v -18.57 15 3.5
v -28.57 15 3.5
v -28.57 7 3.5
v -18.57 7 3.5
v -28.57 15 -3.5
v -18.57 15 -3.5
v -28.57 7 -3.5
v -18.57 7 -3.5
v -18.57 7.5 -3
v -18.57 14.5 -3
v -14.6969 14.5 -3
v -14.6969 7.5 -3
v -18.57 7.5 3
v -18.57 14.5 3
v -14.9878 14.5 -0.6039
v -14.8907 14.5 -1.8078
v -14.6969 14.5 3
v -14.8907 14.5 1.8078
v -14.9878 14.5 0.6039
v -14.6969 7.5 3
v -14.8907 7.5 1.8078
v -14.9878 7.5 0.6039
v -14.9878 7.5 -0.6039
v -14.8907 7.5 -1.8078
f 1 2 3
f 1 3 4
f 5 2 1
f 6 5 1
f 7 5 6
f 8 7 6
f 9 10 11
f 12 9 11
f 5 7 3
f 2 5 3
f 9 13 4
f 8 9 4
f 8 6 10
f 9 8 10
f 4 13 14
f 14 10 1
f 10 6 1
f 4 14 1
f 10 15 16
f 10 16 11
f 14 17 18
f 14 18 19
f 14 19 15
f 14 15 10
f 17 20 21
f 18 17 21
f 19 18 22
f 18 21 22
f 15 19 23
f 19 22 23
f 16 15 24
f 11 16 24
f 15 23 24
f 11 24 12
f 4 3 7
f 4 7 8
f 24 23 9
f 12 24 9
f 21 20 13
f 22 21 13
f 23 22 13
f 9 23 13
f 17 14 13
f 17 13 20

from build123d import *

# Parameters (mm, degrees)
SKETCH006_W     = 5
SKETCH006_H     = 6
SKETCH006_W_2   = 10
SKETCH006_H_2   = 7
SKETCH006_W_3   = 2.5
SKETCH006_H_3   = 1.5
PAD002_DEPTH    = 8
SKETCH007_R     = 15
POCKET004_DEPTH = 8.001
SKETCH008_W     = 2.5
SKETCH008_H     = 4.49
POCKET005_DEPTH = 4.251
SKETCH009_W     = 3.873062
SKETCH009_H     = 0.5
POCKET006_DEPTH = 6.501


with BuildPart() as part:
    # Sketch006 → Pad002 (new body)
    with BuildSketch(Plane.XZ):
        with Locations((-16.07, 0)):
            Rectangle(SKETCH006_W, SKETCH006_H)
        with Locations((-23.57, 0)):
            Rectangle(SKETCH006_W_2, SKETCH006_H_2)
        with Locations((-29.82, 0)):
            Rectangle(SKETCH006_W_3, SKETCH006_H_3)
    extrude(amount=PAD002_DEPTH)

    # Sketch007 (on Face14 of Pad002) → Pocket004 (cut, through all)
    with BuildSketch(Plane.XZ.offset(8)):
        Circle(SKETCH007_R)
    extrude(amount=-POCKET004_DEPTH, mode=Mode.SUBTRACT)

    # Sketch008 (on Face8 of Pocket004) → Pocket005 (cut, through all)
    with BuildSketch(Plane(origin=(0, 0, 0.75), x_dir=(-1, 0, 0), z_dir=(0, 0, 1))):
        with Locations((29.82, 5.755)):
            Rectangle(SKETCH008_W, SKETCH008_H)
        with Locations((29.82, 2.245)):
            Rectangle(SKETCH008_W, SKETCH008_H)
    extrude(amount=-POCKET005_DEPTH, mode=Mode.SUBTRACT)

    # Sketch009 (on Face8 of Pocket005) → Pocket006 (cut, through all)
    with BuildSketch(Plane(origin=(0, 0, 3), x_dir=(-1, 0, 0), z_dir=(0, 0, 1))):
        with Locations((16.633469, 7.75)):
            Rectangle(SKETCH009_W, SKETCH009_H)
        with Locations((16.633469, 0.25)):
            Rectangle(SKETCH009_W, SKETCH009_H)
    extrude(amount=-POCKET006_DEPTH, mode=Mode.SUBTRACT)


with BuildPart() as part_1:
    # Body002 placement: moved
    add(part.part.moved(Location((0, 15, 0))))


solid = part_1.part
